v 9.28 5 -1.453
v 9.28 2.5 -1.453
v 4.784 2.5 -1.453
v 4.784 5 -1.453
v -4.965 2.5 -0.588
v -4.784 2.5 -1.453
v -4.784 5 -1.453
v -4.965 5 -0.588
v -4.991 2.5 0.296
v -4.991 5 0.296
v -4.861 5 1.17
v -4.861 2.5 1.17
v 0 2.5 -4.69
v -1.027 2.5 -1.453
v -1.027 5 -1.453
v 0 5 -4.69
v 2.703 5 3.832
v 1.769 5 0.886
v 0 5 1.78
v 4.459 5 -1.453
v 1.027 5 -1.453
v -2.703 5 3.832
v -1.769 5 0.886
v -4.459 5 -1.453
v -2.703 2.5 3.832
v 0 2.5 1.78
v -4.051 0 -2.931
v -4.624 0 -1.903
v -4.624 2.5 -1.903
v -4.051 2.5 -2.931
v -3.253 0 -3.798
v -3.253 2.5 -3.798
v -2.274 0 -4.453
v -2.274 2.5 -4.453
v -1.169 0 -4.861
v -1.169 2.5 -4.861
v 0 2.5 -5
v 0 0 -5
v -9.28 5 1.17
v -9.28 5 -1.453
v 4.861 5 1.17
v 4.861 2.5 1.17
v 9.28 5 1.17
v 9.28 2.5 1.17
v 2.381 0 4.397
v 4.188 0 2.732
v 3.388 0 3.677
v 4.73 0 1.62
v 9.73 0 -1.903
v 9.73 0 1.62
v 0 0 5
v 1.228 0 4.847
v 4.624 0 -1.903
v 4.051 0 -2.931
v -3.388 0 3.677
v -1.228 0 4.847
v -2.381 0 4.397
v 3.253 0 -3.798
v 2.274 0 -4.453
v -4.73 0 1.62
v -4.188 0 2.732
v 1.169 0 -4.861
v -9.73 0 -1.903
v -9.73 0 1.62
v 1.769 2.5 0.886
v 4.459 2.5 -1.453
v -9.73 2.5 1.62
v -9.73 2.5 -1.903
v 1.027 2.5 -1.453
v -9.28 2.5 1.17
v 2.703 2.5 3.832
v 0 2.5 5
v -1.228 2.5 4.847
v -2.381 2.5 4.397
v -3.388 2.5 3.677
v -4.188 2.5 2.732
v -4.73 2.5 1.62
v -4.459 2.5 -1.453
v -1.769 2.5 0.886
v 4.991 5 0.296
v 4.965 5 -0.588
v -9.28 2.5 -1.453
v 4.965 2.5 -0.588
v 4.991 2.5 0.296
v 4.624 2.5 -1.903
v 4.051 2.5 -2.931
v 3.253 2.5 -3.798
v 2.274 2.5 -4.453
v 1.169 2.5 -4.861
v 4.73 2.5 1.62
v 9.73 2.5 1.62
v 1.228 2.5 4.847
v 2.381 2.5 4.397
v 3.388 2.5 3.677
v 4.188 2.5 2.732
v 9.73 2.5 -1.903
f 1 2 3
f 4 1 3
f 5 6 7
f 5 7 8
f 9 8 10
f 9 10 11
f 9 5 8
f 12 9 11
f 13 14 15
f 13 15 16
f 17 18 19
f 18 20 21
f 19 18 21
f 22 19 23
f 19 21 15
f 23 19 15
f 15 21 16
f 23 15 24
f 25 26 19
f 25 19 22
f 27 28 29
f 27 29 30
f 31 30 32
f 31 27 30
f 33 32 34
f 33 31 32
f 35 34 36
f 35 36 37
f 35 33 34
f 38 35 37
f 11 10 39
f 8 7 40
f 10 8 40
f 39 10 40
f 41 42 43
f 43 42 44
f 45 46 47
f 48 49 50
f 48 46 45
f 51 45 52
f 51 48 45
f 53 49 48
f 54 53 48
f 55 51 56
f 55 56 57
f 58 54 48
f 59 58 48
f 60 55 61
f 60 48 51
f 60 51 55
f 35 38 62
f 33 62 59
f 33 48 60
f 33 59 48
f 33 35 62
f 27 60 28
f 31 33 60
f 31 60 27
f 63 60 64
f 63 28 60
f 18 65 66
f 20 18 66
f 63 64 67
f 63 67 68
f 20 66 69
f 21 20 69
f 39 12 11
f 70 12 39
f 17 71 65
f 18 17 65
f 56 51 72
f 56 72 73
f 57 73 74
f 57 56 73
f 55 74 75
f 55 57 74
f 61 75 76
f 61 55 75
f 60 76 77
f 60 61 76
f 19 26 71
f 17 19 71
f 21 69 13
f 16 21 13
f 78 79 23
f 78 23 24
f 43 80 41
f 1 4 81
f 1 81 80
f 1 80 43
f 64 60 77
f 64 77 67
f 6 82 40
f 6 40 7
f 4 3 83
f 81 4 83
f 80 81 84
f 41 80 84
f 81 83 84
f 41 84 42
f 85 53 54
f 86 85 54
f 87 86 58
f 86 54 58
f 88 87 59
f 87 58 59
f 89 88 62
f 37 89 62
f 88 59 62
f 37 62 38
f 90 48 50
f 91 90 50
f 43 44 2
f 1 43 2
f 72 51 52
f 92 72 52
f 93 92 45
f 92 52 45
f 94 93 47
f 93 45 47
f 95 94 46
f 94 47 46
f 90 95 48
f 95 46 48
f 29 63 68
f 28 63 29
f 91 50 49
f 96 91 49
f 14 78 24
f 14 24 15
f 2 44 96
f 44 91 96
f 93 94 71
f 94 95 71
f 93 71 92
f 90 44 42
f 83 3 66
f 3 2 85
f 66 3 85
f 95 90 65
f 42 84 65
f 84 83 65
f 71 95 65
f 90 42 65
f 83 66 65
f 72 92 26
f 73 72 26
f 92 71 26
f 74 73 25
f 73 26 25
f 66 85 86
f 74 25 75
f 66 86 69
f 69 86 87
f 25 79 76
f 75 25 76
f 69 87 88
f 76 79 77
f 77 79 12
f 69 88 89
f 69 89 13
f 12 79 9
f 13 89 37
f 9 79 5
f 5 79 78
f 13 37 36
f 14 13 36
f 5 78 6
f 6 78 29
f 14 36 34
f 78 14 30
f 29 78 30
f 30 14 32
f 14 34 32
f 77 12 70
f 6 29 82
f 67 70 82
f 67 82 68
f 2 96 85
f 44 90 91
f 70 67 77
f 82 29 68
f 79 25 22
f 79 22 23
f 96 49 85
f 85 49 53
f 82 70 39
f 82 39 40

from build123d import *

# Parameters (mm, degrees)
BOSS_EXTRUDE1_DEPTH   = 5
BOSS_EXTRUDE1_2_DEPTH = 5
BOSS_EXTRUDE2_DEPTH   = 2.5


with BuildPart() as part:
    # Sketch3 → Boss-Extrude1 (new body)
    with BuildSketch(Plane(origin=(0, 0, 0), x_dir=(1, 0, 0), z_dir=(0, 1, 0))):
        with BuildLine():
            Line((9.280338467, 1.452751925), (4.784298469, 1.452751925))
            ThreePointArc((4.784298469, 1.452751925), (4.997850706, 0.146588935), (4.861220275, -1.16984505))
            Line((4.861220275, -1.16984505), (9.280338467, -1.16984505))
            Line((9.280338467, -1.16984505), (9.280338467, 1.452751925))
        make_face()
    extrude(amount=BOSS_EXTRUDE1_DEPTH)



with BuildPart() as body_2:
    # Sketch3 → Boss-Extrude1 2 (new body)
    with BuildSketch(Plane(origin=(0, 0, 0), x_dir=(1, 0, 0), z_dir=(0, 1, 0))):
        Polygon((1.026915579, 1.452751925), (0, 4.69), (0, -1.780366005), (2.703467563, -3.832409573), (1.768831042, -0.886061948), (4.459328632, 1.452751925), align=None)
    extrude(amount=BOSS_EXTRUDE1_2_DEPTH)


with BuildPart() as part_1:
    add(part.part)

    add(body_2.part)  # Boss-Extrude2 merges body 2
    # Sketch3<3> → Boss-Extrude2 (add)
    with BuildSketch(Plane(origin=(0, 0, 0), x_dir=(1, 0, 0), z_dir=(0, 1, 0))):
        with BuildLine():
            Line((9.730338467, -1.61984505), (9.730338467, 1.902751925))
            Line((9.730338467, 1.902751925), (4.623800938, 1.902751925))
            ThreePointArc((4.623800938, 1.902751925), (2.782646256, 4.154140081), (0, 5))
            Line((0, 5), (0, 4.69))
            Line((0, 4.69), (1.026915579, 1.452751925))
            Line((1.026915579, 1.452751925), (4.459328632, 1.452751925))
            Line((4.459328632, 1.452751925), (1.768831042, -0.886061948))
            Line((1.768831042, -0.886061948), (2.703467563, -3.832409573))
            Line((2.703467563, -3.832409573), (0, -1.780366005))
            Line((0, -1.780366005), (0, -5))
            ThreePointArc((0, -5), (2.906955, -4.068121511), (4.730338467, -1.61984505))
            Line((4.730338467, -1.61984505), (9.730338467, -1.61984505))
        make_face()
        with BuildLine():
            Line((9.280338467, -1.16984505), (4.861220275, -1.16984505))
            ThreePointArc((4.861220275, -1.16984505), (4.997850706, 0.146588935), (4.784298469, 1.452751925))
            Line((4.784298469, 1.452751925), (9.280338467, 1.452751925))
            Line((9.280338467, 1.452751925), (9.280338467, -1.16984505))
        make_face(mode=Mode.SUBTRACT)
    extrude(amount=BOSS_EXTRUDE2_DEPTH)

    # Mirror1: part across plane


with BuildPart() as part_2:
    add(part_1.part)
    add(part_1.part.mirror(Plane(origin=(0, 0, 0), x_dir=(0, 0, 1), z_dir=(1, 0, 0))))


solid = part_2.part
